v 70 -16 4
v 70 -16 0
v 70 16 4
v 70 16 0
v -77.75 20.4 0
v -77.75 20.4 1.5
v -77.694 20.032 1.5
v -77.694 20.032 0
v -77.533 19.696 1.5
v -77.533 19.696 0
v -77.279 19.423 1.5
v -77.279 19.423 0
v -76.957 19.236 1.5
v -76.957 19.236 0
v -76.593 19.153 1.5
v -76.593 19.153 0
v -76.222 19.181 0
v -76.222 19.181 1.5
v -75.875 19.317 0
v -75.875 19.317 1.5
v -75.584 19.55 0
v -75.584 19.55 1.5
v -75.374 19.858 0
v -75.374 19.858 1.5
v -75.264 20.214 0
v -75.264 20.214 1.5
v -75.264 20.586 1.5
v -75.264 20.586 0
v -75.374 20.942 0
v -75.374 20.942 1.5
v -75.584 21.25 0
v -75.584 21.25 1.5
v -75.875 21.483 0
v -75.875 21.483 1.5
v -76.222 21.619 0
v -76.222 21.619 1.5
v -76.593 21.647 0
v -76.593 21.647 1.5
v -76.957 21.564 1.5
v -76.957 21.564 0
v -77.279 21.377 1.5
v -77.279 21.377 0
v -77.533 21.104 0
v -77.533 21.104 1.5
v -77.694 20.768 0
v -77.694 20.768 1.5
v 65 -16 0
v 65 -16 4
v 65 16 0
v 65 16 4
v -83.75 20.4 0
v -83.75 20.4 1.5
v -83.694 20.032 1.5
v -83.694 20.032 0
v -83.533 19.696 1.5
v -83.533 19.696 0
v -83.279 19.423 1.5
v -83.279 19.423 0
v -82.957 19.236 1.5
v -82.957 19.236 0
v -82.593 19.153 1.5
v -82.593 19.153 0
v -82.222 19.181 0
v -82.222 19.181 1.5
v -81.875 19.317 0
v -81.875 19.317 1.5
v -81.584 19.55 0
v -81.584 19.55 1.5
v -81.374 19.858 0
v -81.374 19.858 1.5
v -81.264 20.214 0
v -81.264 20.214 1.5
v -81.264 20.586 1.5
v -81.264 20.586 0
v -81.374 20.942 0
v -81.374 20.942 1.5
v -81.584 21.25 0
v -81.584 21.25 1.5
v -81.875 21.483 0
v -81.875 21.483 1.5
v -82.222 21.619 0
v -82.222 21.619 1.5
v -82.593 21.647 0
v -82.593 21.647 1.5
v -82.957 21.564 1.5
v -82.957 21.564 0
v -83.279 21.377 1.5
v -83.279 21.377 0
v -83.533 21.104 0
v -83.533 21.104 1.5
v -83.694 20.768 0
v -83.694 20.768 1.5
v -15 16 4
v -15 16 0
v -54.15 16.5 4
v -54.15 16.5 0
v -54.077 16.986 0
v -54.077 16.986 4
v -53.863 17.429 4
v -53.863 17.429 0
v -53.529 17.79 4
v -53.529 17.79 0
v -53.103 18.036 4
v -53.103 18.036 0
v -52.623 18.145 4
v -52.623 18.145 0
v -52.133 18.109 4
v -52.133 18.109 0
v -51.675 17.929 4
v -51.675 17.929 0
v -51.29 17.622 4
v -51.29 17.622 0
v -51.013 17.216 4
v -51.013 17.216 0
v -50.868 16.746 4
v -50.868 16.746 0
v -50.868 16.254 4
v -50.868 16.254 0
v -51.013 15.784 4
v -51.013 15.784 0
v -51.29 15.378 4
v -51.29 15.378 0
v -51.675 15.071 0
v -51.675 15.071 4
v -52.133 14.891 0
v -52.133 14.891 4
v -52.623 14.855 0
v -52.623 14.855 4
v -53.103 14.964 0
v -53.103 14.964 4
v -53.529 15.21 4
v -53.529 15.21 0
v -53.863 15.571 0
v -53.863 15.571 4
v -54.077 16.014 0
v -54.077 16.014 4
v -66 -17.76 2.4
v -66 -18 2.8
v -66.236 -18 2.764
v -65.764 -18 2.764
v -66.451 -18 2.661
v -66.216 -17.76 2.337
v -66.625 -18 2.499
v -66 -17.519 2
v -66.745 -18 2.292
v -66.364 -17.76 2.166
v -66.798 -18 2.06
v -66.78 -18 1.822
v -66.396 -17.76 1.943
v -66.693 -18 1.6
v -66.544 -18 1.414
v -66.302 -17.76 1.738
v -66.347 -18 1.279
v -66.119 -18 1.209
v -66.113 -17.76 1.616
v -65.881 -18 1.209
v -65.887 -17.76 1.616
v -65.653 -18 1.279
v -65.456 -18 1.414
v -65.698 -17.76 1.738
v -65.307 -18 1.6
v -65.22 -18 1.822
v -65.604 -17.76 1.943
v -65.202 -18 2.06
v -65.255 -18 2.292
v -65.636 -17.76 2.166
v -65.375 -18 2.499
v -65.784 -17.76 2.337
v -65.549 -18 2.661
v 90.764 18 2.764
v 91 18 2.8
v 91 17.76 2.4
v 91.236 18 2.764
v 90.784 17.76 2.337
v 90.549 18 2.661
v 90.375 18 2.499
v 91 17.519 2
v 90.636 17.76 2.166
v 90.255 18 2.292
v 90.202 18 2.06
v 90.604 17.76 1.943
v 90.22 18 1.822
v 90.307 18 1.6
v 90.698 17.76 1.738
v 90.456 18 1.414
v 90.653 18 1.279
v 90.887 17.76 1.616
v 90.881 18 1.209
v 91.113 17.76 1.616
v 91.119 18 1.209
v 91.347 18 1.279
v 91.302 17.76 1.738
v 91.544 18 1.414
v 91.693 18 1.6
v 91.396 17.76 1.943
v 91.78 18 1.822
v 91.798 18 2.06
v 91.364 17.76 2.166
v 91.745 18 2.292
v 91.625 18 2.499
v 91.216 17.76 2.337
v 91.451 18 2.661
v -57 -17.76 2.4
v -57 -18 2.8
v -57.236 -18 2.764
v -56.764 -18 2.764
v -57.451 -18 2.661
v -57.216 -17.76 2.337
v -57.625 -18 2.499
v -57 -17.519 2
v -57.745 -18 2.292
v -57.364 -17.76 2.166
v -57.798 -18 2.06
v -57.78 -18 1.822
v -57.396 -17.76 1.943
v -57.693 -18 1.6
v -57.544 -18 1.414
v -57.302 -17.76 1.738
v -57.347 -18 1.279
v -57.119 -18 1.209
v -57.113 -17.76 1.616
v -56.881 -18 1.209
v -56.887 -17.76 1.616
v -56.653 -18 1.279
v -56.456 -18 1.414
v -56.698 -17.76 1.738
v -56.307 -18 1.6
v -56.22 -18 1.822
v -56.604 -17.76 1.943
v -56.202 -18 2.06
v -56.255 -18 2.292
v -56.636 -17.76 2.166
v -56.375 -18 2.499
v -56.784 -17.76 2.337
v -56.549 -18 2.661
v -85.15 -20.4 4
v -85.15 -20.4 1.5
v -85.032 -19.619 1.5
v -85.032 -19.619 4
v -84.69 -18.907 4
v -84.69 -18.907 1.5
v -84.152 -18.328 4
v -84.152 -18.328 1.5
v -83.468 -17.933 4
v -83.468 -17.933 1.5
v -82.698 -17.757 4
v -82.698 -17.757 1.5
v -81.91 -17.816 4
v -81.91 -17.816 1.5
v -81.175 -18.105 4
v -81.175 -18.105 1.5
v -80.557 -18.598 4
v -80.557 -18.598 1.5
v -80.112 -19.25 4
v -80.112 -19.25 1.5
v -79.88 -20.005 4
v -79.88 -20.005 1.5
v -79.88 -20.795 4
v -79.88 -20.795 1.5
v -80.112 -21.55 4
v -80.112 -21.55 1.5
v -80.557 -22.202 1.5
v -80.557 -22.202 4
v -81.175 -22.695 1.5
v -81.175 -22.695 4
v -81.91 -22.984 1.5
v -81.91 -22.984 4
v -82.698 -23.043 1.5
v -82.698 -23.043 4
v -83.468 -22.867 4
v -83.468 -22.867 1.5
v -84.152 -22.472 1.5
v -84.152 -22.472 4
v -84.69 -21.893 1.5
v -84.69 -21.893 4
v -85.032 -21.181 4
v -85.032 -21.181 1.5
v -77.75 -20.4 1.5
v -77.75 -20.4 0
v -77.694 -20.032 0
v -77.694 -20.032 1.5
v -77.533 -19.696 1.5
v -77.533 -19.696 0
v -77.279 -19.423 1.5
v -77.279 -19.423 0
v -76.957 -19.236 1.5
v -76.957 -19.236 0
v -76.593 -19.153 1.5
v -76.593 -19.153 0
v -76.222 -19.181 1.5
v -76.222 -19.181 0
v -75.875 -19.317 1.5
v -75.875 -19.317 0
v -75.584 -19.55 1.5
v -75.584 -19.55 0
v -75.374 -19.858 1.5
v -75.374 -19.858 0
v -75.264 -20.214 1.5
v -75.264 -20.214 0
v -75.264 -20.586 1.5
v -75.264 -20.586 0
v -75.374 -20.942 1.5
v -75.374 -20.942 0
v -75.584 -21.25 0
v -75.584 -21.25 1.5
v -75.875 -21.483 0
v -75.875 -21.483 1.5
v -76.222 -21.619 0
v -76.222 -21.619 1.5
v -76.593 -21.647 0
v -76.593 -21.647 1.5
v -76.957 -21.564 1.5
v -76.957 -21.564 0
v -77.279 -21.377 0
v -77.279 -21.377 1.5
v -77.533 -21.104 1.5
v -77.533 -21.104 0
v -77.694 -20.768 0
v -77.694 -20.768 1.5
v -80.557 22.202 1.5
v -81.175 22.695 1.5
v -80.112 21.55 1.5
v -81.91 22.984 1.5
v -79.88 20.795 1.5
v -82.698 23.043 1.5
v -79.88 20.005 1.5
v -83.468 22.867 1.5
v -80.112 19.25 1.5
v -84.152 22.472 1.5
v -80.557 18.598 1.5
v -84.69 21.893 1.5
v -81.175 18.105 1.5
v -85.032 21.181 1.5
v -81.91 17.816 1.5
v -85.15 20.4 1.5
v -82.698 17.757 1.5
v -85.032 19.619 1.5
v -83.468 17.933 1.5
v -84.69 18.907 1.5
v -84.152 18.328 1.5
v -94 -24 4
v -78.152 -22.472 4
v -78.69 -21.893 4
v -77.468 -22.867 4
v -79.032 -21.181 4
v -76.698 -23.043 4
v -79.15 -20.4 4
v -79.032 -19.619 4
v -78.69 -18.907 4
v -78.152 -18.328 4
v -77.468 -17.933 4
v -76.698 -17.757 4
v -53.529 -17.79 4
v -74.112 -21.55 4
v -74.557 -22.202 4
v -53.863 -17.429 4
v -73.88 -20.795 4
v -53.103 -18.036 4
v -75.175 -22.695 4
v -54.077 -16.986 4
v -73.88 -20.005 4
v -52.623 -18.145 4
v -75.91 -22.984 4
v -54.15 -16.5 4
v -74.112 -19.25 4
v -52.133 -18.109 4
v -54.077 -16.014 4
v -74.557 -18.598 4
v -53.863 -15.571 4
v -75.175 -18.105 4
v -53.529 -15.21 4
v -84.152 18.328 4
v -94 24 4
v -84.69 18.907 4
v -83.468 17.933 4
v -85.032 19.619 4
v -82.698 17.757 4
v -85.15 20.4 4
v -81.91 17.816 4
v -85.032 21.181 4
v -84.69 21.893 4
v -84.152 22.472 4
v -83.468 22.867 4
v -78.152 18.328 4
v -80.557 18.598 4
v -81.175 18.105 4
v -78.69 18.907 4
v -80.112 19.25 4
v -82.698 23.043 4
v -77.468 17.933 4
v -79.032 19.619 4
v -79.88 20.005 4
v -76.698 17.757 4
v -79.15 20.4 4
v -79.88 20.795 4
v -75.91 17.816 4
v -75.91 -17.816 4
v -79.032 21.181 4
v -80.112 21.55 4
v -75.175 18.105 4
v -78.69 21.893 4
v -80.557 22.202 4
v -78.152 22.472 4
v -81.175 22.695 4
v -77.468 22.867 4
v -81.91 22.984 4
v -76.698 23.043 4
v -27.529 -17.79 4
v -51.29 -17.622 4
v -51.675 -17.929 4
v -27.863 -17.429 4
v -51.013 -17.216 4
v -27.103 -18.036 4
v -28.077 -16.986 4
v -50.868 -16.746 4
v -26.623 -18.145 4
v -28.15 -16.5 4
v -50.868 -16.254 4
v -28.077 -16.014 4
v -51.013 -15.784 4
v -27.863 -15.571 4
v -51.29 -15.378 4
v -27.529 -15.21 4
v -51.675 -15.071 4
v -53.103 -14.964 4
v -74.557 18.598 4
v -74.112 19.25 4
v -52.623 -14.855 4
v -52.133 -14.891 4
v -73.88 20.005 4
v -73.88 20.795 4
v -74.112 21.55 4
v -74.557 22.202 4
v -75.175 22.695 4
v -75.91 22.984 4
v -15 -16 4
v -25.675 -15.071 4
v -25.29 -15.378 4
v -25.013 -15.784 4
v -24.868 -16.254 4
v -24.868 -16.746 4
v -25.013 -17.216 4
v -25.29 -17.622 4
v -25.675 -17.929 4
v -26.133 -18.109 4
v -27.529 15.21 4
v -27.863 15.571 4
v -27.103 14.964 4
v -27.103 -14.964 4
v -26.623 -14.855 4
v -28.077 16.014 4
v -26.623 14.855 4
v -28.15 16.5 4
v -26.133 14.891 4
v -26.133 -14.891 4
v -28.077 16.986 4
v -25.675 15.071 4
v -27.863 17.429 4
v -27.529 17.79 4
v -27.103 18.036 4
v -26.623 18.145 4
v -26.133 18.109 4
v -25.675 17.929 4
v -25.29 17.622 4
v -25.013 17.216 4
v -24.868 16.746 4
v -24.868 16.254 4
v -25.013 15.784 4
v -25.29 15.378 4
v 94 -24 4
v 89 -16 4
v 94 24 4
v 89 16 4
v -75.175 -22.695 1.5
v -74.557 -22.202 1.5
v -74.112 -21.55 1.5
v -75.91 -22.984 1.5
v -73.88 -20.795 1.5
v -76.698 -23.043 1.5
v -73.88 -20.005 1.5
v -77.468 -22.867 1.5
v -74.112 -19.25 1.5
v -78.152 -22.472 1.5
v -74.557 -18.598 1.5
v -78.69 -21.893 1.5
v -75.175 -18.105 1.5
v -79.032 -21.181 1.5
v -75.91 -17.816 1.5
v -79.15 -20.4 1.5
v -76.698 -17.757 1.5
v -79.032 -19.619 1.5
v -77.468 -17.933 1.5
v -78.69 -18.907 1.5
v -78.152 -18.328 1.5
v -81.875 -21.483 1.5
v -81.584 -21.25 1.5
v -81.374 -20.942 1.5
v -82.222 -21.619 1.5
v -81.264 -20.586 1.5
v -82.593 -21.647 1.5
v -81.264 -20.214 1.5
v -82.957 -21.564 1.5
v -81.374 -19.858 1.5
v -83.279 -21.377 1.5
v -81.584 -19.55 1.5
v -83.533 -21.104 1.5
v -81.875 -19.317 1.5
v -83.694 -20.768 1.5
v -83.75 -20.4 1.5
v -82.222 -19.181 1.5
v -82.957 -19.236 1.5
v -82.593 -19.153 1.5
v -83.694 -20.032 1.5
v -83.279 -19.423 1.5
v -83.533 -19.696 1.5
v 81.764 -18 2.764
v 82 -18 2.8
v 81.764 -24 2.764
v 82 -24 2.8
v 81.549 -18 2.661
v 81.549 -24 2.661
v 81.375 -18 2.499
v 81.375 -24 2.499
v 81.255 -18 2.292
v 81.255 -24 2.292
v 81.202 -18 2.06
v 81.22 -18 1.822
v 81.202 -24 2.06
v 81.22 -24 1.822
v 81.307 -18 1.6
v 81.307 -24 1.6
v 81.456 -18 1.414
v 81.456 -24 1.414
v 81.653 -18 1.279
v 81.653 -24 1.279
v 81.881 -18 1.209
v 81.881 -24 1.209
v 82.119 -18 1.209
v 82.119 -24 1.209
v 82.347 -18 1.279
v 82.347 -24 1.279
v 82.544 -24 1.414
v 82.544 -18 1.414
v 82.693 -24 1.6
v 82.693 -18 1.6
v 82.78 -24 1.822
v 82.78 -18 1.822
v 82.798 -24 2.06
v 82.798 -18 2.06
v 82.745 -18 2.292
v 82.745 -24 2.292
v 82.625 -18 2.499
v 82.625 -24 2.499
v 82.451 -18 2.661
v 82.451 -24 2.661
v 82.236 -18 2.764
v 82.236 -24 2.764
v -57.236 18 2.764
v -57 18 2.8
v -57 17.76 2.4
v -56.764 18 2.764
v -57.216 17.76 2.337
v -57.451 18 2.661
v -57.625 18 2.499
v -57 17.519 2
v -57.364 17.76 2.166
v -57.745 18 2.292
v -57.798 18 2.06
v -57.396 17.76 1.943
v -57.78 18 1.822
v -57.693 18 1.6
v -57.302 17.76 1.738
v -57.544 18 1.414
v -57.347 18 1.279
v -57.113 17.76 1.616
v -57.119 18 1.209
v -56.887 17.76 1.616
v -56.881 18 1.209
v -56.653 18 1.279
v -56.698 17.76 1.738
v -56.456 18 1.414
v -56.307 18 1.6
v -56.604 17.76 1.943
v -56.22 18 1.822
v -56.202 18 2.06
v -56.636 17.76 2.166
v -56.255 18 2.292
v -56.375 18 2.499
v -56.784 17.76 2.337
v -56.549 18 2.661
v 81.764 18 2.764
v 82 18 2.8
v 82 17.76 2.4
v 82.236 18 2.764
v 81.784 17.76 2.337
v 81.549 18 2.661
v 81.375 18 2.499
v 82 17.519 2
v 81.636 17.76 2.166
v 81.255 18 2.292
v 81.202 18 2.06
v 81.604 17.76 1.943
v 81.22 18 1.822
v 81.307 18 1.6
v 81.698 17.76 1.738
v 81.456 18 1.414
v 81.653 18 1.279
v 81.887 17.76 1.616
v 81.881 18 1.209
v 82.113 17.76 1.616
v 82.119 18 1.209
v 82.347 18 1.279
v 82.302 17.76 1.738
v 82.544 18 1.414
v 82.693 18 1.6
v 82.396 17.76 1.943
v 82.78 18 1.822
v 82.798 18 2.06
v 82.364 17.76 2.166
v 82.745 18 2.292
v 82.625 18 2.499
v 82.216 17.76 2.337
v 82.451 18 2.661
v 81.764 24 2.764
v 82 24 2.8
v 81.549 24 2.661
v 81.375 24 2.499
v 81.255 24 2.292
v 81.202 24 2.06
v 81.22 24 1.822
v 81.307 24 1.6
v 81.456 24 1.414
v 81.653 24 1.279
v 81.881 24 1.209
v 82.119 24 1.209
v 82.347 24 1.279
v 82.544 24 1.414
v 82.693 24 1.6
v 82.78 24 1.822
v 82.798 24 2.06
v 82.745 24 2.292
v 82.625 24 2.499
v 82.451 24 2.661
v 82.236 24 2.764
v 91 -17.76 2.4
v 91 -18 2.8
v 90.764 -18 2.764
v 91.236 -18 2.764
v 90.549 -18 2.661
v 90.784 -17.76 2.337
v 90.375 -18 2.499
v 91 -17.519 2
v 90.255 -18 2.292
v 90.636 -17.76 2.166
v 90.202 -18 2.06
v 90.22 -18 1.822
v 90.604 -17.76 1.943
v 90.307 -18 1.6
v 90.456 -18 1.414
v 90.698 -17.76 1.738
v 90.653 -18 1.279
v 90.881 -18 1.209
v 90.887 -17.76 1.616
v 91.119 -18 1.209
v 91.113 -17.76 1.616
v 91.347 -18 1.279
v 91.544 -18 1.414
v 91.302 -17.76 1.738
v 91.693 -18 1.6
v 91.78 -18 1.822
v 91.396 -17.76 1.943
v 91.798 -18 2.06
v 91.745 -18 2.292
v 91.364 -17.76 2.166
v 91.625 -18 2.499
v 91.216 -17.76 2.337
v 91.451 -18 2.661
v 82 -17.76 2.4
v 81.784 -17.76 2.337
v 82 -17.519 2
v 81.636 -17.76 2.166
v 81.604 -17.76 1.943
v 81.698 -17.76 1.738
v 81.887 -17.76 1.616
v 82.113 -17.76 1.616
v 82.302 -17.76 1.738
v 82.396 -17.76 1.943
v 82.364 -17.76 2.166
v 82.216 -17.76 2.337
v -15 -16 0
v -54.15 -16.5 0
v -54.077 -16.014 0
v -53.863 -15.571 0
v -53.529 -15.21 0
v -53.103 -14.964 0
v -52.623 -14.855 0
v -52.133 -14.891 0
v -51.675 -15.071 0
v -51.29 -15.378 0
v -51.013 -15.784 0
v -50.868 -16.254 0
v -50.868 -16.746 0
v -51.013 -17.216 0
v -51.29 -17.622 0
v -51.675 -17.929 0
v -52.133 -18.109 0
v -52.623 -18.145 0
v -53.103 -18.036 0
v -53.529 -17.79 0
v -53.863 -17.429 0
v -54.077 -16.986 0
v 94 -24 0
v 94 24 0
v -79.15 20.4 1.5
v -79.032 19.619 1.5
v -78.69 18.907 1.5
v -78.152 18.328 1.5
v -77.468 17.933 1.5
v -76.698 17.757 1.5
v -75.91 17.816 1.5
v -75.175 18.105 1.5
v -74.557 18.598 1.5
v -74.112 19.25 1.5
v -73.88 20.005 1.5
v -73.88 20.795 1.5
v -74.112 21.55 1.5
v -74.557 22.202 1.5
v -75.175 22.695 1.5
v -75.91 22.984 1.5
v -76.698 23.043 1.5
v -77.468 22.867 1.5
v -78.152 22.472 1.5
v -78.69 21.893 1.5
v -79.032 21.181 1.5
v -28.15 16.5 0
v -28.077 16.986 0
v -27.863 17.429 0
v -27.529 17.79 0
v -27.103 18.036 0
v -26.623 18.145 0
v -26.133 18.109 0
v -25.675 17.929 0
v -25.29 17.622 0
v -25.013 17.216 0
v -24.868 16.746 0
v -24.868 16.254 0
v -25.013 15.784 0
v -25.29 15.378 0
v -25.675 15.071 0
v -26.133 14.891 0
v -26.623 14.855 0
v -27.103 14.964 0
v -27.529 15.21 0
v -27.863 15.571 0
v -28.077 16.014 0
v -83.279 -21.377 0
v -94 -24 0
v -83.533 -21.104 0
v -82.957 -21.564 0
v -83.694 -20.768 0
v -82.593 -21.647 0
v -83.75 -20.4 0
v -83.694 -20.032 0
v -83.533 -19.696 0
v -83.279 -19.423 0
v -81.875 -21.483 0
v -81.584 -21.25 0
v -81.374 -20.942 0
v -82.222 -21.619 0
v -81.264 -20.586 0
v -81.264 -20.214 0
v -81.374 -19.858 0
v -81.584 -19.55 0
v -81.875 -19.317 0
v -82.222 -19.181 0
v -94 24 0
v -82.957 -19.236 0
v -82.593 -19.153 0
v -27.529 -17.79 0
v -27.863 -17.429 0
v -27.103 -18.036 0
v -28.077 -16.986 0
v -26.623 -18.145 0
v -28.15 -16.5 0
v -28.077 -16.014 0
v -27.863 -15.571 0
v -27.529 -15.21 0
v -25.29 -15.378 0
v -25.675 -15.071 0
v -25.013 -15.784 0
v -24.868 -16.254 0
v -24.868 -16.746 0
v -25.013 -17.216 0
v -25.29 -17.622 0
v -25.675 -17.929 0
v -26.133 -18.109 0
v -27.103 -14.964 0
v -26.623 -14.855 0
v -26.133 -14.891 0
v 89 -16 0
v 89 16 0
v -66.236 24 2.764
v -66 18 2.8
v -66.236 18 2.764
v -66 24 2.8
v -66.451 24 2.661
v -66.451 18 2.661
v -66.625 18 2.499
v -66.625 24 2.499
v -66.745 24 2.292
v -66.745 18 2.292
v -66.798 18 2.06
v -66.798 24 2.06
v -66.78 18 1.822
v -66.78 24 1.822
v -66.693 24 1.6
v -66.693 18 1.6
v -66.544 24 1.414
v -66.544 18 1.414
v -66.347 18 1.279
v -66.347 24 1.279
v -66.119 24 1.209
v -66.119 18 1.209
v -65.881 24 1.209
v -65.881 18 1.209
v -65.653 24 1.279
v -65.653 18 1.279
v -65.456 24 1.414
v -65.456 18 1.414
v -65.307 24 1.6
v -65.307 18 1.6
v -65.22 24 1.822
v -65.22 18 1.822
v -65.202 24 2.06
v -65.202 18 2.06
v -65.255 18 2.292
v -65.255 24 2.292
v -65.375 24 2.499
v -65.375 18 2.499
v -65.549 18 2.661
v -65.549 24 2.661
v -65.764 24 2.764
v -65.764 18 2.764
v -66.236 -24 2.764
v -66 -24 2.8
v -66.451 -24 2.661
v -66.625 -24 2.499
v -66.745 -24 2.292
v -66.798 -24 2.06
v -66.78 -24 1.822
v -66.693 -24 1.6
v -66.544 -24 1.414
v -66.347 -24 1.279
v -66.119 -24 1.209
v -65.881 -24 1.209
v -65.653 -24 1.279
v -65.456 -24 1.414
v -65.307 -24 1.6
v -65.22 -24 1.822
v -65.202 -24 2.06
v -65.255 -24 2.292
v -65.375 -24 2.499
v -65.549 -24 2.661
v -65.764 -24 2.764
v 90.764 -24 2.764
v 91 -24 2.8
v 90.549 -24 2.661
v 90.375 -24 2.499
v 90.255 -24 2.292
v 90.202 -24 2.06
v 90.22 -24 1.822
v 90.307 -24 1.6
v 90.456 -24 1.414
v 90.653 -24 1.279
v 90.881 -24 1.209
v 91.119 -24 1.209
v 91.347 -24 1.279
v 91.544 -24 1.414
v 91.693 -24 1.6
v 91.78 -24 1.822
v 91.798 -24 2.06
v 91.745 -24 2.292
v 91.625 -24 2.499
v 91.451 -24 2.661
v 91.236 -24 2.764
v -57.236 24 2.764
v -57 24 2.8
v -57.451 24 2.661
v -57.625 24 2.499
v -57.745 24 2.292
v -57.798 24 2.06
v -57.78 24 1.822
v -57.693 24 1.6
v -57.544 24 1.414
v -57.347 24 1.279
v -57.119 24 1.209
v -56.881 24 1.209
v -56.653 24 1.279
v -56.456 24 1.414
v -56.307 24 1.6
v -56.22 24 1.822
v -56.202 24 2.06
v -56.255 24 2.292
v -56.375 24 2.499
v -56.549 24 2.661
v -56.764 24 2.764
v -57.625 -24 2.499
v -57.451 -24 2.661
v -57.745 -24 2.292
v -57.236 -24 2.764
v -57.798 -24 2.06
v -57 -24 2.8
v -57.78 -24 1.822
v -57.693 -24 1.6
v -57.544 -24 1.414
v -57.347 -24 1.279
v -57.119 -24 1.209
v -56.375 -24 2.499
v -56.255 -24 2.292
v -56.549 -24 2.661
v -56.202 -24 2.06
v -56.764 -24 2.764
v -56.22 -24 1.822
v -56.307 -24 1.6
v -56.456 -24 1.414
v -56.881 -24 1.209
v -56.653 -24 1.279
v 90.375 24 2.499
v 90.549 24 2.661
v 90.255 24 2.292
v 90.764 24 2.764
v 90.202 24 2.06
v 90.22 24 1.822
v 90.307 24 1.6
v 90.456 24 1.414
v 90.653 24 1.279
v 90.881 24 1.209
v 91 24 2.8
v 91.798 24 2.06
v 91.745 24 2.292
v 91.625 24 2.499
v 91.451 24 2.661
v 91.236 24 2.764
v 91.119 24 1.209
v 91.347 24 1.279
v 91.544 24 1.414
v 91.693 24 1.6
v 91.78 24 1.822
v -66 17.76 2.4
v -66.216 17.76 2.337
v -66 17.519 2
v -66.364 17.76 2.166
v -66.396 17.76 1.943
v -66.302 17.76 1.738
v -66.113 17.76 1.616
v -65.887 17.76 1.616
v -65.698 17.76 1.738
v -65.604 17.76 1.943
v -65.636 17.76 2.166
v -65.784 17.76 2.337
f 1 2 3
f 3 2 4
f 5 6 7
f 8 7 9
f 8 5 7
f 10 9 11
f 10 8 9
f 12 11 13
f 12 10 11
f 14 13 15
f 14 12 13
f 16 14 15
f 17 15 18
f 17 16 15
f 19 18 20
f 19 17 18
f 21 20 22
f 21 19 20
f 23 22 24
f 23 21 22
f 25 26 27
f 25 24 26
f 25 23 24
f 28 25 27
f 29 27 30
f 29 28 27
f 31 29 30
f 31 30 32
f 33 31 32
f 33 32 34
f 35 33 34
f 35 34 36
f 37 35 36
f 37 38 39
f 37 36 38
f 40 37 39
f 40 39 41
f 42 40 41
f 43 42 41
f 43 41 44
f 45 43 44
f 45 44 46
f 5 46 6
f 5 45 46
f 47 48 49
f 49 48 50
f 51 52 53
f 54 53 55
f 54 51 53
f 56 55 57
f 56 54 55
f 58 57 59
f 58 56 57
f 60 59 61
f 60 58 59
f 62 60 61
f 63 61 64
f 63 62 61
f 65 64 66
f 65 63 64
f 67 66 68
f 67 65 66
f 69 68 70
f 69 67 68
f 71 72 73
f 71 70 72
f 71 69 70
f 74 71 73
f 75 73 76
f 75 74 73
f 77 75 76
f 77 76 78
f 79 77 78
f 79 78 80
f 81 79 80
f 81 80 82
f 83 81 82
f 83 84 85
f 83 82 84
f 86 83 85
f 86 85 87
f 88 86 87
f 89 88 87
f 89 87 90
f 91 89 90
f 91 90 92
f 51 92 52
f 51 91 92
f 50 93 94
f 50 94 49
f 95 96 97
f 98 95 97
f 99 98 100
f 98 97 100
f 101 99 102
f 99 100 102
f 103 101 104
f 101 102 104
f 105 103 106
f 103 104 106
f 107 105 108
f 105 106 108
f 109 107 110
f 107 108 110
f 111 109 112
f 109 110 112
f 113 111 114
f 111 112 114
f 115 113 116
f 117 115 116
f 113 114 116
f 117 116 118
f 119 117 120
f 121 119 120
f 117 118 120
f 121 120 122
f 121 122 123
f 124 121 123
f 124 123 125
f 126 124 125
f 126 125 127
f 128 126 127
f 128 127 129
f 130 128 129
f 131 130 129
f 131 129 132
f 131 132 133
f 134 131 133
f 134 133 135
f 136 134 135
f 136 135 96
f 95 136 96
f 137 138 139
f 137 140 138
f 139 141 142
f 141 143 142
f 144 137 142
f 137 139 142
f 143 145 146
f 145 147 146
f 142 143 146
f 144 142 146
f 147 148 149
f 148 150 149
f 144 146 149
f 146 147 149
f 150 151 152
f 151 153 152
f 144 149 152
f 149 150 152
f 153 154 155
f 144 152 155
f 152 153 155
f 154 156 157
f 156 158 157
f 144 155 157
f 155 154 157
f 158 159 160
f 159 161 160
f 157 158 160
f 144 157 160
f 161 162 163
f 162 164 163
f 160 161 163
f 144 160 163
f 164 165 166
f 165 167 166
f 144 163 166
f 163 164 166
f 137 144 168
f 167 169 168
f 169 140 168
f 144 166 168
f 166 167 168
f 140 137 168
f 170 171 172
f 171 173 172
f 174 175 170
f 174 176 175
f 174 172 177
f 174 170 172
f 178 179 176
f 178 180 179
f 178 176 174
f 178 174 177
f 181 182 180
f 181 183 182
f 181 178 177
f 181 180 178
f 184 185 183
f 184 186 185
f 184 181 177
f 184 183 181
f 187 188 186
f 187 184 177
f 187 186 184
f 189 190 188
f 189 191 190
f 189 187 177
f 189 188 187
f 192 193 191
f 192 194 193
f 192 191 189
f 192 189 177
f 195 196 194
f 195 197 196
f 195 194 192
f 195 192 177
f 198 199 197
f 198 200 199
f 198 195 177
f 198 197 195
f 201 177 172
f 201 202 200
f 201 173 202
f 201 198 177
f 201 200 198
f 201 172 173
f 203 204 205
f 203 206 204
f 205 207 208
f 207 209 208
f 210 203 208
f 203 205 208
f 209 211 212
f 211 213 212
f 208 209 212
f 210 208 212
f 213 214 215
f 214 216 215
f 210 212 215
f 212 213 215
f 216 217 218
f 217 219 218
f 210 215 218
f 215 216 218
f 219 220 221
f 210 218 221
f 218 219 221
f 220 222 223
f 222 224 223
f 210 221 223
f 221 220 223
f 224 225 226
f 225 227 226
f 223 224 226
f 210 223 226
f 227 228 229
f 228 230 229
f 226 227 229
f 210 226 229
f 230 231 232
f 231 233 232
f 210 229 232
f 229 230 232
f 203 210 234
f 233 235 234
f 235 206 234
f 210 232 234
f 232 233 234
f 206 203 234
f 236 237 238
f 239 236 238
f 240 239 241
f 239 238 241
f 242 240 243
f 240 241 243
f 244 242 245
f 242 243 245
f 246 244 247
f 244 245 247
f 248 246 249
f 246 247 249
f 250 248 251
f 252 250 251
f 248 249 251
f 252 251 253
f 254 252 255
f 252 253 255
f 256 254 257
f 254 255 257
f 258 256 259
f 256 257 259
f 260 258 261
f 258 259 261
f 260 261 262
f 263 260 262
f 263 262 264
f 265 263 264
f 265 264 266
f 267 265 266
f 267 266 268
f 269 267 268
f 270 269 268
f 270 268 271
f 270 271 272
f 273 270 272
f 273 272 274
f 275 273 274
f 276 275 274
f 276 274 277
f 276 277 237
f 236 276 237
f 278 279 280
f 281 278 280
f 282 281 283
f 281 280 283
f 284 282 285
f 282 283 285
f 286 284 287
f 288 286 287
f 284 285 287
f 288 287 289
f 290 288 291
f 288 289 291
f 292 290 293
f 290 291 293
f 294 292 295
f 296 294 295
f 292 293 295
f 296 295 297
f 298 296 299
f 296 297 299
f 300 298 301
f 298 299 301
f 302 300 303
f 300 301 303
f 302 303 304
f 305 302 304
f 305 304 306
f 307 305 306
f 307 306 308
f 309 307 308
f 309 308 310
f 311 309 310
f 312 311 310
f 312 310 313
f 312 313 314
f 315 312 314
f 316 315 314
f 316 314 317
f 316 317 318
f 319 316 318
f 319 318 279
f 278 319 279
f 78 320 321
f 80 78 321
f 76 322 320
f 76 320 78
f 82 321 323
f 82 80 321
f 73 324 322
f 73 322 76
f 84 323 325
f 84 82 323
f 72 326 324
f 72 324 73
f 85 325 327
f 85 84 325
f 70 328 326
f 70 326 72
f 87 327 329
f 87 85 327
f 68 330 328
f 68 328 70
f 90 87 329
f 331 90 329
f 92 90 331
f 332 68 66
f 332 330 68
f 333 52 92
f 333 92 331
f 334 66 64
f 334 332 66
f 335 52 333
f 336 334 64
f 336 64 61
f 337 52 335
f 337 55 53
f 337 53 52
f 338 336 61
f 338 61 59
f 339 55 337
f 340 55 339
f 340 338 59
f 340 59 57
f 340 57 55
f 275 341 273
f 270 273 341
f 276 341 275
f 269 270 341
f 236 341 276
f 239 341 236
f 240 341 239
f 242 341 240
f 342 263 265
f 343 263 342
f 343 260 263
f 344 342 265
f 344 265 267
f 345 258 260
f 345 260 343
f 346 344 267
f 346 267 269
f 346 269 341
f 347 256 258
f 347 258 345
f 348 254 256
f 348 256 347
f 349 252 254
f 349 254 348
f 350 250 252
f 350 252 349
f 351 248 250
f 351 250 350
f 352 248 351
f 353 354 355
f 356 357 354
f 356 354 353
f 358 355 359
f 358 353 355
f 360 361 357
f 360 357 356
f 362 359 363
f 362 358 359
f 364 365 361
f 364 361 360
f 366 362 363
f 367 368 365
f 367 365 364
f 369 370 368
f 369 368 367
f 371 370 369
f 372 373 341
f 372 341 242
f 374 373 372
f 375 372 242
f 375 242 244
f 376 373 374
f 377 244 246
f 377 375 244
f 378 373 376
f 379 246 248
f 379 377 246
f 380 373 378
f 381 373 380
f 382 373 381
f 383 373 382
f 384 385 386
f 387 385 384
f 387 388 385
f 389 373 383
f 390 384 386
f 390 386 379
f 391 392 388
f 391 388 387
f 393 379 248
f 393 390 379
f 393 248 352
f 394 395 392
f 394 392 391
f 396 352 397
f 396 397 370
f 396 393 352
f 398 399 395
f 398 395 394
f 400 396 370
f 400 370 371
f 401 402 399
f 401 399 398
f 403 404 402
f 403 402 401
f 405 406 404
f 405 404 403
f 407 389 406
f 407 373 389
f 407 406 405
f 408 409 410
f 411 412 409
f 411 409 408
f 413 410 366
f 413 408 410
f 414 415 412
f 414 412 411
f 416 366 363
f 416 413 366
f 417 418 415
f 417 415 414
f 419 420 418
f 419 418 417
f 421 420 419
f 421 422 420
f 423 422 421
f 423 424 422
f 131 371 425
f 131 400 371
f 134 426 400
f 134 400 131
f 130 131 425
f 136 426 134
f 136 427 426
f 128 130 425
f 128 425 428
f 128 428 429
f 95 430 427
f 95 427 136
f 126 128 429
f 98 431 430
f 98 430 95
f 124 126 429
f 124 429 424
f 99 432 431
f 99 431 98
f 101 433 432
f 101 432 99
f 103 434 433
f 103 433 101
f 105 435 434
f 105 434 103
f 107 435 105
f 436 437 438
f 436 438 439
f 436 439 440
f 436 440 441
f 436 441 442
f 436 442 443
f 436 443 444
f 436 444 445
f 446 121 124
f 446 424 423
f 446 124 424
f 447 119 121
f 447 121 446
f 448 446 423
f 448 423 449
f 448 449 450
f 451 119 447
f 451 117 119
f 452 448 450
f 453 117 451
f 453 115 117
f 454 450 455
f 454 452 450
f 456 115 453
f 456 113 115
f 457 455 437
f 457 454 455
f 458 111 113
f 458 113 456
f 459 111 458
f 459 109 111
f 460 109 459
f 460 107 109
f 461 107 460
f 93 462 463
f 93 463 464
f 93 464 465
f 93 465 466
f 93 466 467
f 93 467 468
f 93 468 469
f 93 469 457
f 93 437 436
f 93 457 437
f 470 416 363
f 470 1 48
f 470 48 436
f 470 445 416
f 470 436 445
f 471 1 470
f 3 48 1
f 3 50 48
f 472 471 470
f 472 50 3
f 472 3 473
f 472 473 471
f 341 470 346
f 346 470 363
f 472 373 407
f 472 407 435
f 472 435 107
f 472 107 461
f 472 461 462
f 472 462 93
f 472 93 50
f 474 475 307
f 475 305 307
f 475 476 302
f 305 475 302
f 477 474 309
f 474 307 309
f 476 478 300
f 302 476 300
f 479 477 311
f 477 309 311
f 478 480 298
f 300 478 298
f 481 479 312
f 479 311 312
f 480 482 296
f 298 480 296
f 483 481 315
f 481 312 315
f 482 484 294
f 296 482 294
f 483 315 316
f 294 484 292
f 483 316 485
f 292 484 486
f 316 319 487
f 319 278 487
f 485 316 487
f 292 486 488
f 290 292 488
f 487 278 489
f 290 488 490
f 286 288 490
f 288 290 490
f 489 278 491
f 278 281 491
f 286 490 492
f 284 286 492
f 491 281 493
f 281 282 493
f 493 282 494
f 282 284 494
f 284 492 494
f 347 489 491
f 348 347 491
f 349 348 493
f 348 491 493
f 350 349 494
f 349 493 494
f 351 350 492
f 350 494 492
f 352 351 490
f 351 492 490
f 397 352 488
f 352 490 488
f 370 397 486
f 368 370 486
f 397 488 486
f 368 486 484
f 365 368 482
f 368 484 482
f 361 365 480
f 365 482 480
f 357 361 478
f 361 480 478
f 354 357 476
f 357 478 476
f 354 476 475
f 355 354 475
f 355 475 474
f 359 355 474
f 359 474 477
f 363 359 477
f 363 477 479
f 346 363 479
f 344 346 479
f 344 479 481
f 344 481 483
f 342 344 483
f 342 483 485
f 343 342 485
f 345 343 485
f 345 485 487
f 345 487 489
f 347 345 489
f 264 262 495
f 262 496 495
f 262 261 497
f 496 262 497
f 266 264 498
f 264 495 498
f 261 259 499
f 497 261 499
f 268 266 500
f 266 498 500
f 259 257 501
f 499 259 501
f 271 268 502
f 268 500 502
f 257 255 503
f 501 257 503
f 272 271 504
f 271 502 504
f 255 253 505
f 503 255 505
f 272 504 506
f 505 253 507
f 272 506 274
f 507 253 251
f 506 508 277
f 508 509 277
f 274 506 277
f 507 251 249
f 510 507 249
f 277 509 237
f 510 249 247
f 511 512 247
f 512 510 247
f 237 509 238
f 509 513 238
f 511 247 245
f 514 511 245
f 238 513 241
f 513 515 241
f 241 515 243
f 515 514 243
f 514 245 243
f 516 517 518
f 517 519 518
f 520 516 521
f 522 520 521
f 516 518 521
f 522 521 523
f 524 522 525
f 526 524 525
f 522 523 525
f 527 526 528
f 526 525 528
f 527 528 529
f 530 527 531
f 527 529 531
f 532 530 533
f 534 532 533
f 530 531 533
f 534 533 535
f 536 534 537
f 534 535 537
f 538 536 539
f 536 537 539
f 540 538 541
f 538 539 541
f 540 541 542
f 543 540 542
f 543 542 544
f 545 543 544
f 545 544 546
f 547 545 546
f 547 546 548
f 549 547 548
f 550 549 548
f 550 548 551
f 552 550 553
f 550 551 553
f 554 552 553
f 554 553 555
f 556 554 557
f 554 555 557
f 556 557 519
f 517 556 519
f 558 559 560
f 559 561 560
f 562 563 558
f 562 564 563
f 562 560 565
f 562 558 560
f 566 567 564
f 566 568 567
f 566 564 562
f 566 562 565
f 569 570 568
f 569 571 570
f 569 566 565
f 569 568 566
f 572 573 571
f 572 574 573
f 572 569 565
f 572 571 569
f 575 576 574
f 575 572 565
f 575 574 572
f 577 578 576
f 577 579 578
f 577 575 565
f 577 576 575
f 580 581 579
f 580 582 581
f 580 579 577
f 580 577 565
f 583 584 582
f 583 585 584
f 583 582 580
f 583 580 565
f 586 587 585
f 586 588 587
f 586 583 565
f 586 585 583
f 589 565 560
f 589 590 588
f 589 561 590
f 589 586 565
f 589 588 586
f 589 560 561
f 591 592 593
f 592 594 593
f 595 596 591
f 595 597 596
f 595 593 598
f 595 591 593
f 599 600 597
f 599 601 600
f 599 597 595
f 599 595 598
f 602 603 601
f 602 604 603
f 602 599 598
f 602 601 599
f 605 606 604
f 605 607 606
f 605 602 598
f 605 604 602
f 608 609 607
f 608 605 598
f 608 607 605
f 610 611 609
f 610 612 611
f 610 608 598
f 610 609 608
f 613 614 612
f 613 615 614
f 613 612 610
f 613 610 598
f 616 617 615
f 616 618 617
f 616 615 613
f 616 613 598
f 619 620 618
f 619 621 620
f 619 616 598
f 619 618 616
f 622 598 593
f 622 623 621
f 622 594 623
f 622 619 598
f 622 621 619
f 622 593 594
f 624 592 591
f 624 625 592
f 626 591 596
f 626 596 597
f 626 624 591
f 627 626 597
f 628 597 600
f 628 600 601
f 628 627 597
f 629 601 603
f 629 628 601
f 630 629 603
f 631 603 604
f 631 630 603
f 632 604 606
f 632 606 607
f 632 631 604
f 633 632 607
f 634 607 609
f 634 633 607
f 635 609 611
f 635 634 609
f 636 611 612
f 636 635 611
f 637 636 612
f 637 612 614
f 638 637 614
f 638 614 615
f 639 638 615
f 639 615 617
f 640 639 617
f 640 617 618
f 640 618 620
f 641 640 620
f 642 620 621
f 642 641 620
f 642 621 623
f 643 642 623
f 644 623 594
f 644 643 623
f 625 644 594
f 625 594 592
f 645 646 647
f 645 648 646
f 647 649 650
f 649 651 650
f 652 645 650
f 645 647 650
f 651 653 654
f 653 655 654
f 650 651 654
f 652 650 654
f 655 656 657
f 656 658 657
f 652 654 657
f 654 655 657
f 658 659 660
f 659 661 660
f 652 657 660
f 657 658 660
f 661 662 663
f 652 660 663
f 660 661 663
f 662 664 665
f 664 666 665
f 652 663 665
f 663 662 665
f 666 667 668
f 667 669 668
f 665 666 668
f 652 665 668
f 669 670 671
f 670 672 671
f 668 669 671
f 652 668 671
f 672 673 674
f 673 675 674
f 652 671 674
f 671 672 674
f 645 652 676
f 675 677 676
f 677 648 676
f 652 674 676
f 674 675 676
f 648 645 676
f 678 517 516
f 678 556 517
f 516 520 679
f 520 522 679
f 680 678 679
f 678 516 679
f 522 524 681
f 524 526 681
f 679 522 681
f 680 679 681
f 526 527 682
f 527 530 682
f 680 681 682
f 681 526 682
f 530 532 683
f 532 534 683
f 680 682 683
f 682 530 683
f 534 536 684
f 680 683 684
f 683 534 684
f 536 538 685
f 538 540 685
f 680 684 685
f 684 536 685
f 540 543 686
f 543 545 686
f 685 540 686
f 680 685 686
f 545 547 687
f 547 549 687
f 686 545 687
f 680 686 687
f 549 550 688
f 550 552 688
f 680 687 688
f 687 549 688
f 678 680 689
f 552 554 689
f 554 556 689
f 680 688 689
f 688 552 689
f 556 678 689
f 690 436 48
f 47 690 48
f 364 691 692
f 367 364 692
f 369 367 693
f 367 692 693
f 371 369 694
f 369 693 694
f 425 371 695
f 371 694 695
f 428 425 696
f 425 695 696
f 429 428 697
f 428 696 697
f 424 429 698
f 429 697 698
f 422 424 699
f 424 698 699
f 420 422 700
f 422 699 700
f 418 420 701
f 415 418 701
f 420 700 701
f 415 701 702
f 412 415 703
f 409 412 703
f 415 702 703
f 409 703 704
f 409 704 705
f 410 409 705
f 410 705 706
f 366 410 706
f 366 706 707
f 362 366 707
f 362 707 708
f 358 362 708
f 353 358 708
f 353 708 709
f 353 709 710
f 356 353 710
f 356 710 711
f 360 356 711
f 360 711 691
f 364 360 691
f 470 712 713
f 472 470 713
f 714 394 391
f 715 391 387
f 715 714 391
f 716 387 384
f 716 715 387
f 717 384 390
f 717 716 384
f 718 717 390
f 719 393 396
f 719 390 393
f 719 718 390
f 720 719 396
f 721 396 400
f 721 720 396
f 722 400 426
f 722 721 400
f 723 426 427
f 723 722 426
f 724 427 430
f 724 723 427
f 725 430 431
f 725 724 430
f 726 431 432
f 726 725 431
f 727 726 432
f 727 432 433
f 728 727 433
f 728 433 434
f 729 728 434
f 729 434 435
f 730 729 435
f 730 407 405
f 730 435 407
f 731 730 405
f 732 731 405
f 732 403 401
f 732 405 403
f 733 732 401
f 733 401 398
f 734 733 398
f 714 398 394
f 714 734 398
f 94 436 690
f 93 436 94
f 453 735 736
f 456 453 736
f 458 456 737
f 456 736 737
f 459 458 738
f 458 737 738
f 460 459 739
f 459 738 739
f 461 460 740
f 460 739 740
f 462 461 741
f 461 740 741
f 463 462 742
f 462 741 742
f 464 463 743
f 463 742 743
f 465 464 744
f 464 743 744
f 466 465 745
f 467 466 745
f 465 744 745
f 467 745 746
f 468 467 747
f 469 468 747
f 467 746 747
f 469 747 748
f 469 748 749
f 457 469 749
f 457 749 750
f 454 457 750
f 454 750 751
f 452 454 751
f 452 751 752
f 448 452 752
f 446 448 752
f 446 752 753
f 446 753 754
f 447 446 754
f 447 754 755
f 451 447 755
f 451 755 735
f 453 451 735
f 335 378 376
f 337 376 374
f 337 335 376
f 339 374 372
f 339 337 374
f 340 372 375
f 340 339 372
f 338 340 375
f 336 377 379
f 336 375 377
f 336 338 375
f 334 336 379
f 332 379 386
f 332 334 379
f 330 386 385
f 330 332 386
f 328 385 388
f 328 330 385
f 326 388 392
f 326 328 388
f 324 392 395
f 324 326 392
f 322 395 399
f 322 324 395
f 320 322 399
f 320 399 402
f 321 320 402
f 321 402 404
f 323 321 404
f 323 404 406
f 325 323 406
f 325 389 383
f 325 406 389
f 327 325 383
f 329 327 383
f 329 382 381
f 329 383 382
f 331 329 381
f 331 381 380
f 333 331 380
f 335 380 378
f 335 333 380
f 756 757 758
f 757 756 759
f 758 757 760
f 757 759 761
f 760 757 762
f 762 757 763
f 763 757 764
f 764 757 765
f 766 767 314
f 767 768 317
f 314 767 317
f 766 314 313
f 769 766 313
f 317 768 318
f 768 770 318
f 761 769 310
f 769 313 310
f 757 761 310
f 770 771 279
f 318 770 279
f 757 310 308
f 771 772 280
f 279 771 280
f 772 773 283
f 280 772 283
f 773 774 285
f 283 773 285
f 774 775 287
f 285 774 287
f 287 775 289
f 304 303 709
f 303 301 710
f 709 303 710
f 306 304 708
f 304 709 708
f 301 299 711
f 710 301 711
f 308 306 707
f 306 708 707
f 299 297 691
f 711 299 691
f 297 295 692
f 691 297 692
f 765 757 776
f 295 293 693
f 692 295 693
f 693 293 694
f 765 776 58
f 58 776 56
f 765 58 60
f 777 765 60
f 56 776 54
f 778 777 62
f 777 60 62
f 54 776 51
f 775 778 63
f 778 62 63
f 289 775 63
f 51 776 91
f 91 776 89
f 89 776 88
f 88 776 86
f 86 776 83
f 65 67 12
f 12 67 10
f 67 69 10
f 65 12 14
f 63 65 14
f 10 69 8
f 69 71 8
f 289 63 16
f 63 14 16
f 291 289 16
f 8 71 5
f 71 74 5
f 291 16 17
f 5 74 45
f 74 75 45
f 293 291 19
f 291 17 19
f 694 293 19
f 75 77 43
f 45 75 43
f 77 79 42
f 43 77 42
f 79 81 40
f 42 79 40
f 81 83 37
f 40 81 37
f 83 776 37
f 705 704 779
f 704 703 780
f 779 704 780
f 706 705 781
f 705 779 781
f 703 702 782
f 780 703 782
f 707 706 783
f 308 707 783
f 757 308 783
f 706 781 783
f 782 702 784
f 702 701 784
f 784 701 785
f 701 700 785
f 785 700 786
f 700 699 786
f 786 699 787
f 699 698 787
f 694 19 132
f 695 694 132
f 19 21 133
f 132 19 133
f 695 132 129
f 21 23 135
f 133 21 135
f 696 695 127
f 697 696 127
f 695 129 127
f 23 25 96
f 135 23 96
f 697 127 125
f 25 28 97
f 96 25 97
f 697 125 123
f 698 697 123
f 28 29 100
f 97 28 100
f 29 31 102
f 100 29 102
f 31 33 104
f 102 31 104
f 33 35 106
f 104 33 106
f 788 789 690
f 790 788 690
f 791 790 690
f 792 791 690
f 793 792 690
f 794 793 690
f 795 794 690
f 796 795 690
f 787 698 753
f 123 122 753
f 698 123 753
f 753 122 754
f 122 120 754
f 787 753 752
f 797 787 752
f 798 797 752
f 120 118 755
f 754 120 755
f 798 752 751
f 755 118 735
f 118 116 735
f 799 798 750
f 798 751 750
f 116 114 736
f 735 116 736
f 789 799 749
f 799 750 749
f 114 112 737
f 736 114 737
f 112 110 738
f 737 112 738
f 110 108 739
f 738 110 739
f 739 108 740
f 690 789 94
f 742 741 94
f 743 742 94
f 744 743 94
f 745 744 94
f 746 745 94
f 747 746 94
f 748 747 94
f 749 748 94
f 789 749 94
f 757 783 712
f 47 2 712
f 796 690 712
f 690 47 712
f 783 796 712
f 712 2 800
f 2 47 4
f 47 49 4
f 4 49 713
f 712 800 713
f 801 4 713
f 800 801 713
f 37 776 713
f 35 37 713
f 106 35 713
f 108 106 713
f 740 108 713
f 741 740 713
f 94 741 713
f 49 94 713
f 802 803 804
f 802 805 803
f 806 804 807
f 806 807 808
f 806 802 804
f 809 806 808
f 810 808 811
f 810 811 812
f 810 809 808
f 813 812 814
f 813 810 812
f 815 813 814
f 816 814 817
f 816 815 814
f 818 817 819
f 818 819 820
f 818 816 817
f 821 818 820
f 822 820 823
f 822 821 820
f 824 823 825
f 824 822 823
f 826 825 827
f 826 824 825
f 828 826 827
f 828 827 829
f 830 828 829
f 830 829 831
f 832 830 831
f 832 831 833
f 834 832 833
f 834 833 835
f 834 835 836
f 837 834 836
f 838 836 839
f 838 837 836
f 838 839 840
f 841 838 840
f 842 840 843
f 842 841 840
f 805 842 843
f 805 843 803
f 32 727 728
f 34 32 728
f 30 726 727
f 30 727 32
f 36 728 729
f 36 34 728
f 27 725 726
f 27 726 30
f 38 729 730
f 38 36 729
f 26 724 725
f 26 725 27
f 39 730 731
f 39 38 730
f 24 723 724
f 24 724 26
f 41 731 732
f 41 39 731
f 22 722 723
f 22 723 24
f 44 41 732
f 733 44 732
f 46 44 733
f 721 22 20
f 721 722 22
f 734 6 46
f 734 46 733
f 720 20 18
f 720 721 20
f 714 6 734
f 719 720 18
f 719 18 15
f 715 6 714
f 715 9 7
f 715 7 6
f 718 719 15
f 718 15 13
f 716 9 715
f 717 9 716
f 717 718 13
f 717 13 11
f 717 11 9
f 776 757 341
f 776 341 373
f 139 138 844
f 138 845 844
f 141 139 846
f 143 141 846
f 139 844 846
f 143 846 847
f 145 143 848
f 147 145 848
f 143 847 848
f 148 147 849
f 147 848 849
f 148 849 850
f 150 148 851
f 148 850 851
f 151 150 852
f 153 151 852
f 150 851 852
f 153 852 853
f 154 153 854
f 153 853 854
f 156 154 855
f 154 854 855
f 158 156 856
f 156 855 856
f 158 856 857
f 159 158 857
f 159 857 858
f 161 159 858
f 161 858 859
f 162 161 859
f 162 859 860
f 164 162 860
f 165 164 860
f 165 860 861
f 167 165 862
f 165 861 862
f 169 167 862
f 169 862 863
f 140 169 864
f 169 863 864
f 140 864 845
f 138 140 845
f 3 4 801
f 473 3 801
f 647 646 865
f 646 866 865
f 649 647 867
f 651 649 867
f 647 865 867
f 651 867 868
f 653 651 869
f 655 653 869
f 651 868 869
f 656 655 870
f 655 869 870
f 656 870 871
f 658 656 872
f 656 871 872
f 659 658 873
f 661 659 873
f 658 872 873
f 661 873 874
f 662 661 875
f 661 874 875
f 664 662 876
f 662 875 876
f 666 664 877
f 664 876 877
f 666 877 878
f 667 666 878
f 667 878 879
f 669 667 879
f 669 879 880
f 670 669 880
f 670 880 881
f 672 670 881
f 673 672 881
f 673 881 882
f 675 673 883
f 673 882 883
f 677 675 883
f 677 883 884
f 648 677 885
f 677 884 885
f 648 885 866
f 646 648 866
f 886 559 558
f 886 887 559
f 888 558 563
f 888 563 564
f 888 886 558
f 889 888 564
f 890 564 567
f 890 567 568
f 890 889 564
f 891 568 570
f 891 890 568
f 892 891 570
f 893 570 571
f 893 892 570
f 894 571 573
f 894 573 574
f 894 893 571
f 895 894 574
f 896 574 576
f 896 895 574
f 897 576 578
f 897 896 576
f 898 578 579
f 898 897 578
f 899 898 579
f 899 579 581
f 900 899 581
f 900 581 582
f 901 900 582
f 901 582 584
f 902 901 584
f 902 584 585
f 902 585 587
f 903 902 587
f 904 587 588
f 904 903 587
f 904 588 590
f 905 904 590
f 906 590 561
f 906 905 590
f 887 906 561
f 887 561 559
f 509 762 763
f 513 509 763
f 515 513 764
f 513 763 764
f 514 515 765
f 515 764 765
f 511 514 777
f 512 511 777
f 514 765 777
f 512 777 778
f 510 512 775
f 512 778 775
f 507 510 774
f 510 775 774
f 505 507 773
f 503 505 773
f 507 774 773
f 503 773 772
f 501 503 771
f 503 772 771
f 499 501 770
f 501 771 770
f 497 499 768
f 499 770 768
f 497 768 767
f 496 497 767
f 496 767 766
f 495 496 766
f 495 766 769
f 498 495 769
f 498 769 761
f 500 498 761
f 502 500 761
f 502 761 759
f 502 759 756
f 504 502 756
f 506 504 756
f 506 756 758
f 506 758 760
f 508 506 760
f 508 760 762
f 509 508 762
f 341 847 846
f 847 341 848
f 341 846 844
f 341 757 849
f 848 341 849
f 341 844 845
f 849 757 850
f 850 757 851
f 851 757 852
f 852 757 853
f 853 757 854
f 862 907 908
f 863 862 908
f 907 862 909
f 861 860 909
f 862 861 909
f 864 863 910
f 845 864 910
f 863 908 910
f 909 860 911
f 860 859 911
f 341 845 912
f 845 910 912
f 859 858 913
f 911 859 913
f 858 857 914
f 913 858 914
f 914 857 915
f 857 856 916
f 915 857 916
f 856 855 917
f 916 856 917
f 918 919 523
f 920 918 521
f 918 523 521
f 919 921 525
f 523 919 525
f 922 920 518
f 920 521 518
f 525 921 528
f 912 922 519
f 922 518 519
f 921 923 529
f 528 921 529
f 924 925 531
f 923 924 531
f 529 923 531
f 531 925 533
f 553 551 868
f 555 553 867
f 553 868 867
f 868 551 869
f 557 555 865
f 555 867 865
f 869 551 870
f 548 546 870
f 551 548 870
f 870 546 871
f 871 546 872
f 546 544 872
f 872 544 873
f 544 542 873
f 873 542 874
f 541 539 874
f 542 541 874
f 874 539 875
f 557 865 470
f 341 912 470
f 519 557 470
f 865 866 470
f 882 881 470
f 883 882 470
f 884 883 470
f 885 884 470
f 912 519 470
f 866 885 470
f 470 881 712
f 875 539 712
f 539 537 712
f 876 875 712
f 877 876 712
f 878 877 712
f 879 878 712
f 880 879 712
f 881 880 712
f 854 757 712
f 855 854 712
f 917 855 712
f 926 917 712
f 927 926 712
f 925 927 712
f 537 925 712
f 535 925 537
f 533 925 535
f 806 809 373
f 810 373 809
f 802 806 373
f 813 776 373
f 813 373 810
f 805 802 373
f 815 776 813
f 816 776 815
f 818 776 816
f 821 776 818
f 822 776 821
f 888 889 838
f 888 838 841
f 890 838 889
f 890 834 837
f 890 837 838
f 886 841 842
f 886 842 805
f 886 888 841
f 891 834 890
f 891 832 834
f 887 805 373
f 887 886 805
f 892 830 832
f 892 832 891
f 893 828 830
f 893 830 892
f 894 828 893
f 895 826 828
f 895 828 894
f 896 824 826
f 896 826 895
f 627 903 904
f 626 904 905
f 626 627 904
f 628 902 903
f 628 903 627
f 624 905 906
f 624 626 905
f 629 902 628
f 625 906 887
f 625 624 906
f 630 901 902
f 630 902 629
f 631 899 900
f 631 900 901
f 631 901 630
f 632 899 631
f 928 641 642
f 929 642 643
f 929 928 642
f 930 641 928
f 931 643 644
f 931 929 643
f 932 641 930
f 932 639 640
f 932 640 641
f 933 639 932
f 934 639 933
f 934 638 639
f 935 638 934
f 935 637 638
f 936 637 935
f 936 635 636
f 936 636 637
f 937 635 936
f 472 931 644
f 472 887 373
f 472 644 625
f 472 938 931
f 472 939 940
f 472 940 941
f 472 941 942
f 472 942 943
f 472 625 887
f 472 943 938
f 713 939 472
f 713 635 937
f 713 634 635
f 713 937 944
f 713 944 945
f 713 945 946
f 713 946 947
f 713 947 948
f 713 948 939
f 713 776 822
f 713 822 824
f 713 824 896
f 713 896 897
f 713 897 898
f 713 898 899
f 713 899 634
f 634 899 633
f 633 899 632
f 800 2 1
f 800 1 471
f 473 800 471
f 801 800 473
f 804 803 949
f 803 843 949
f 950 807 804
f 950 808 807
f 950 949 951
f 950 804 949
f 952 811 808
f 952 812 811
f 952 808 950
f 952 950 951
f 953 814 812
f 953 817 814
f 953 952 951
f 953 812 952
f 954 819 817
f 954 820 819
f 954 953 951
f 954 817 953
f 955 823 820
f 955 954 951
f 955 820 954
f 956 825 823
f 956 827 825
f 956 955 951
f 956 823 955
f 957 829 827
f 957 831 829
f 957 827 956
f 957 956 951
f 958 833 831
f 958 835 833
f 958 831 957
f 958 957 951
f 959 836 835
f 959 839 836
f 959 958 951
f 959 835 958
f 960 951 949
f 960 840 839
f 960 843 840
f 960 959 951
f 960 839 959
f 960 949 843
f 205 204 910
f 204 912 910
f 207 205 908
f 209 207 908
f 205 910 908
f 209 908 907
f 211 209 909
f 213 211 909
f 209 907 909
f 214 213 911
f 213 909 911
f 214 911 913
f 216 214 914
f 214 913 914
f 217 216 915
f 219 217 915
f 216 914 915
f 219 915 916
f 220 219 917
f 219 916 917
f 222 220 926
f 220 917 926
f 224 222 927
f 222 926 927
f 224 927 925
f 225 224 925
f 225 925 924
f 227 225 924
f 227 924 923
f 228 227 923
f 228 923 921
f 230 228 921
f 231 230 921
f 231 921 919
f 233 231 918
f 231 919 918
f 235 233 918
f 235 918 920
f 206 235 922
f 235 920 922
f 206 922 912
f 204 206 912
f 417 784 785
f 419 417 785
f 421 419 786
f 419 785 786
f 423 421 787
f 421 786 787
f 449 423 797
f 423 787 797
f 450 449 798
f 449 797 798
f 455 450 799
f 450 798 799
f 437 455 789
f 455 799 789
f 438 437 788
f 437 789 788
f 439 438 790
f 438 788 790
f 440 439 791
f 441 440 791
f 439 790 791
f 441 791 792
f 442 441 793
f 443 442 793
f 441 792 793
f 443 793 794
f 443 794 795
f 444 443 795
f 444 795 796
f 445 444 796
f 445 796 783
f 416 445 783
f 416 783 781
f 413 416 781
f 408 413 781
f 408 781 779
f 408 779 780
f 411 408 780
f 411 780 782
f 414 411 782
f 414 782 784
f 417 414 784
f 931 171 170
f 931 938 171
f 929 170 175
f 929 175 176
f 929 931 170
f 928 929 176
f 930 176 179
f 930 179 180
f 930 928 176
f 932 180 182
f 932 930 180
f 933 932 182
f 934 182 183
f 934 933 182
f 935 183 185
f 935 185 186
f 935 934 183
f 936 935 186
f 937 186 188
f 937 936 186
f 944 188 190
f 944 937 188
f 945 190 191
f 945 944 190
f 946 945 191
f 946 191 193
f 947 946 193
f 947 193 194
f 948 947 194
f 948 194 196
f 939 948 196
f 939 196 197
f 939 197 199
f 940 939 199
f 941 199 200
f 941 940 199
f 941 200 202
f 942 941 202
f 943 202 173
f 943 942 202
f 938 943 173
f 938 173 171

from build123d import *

# Parameters (mm, degrees)
SKETCH1_W                  = 188
SKETCH1_H                  = 48
BOSS_EXTRUDE1_DEPTH        = 4
SKETCH2_R                  = 1.25
CUT_EXTRUDE1_DEPTH         = 4
CUT_EXTRUDE2_START         = -1.5
SKETCH3_R                  = 2.65
CUT_EXTRUDE2_DEPTH         = 10
M2_TAPPED_HOLE1_AT_2_COUNT = 2
M2_TAPPED_HOLE1_AT_2_PITCH = 9
M2_TAPPED_HOLE1_AT_3_COUNT = 2
M2_TAPPED_HOLE1_AT_3_PITCH = 148
M2_TAPPED_HOLE1_AT_4_COUNT = 2
M2_TAPPED_HOLE1_AT_4_PITCH = 157
CUT_EXTRUDE4_DEPTH         = 98.097888752
CUT_EXTRUDE4_DEPTH_BACK    = 4
SKETCH8_W                  = 19
SKETCH8_H                  = 32
SKETCH9_W                  = 80
SKETCH9_H                  = 32
CUT_EXTRUDE5_DEPTH         = 4
M4_TAPPED_HOLE1_D          = 3.3


with BuildPart() as part:
    # Sketch1 → Boss-Extrude1 (new body)
    with BuildSketch(Plane.XY):
        Rectangle(SKETCH1_W, SKETCH1_H)
    extrude(amount=BOSS_EXTRUDE1_DEPTH)

    # Sketch2 → Cut-Extrude1 (cut)
    with BuildSketch(Plane(origin=(0, 0, 0), x_dir=(-1, 0, 0), z_dir=(0, 0, -1))):
        with Locations((76.5, -20.4)):
            Circle(SKETCH2_R)
        with Locations((82.5, -20.4)):
            Circle(SKETCH2_R)
    cut_extrude1 = extrude(amount=-CUT_EXTRUDE1_DEPTH, mode=Mode.SUBTRACT)

    # Sketch3 → Cut-Extrude2 (cut)
    with BuildSketch(Plane(origin=(0, 0, 0), x_dir=(-1, 0, 0), z_dir=(0, 0, -1)).offset(CUT_EXTRUDE2_START)):
        with Locations((76.5, -20.4)):
            Circle(SKETCH3_R)
        with Locations((82.5, -20.4)):
            Circle(SKETCH3_R)
    cut_extrude2 = extrude(amount=-CUT_EXTRUDE2_DEPTH, mode=Mode.SUBTRACT)

    # Mirror1: Cut-Extrude1, Cut-Extrude2 across plane
    add(cut_extrude1.mirror(Plane(origin=(0, 0, 0), x_dir=(0, 0, 1), z_dir=(0, -1, 0))), mode=Mode.SUBTRACT)
    add(cut_extrude2.mirror(Plane(origin=(0, 0, 0), x_dir=(0, 0, 1), z_dir=(0, -1, 0))), mode=Mode.SUBTRACT)

    # Sketch7 → M2 Tapped Hole1 (revolve, cut)
    with BuildSketch(Plane(origin=(-66, 24, 2), x_dir=(0, 0, 1), z_dir=(1, 0, 0))):
        Polygon((0, 0), (0, 6.480688495), (0.8, 6), (0.8, 0), align=None)
    m2_tapped_hole1 = revolve(axis=Axis((-66, 30.35, 2), (0, -1, 0)), mode=Mode.SUBTRACT)

    # M2 Tapped Hole1 at 2: M2 Tapped Hole1 ×2
    with Locations(*[(i * M2_TAPPED_HOLE1_AT_2_PITCH, 0, 0) for i in range(1, M2_TAPPED_HOLE1_AT_2_COUNT)]):
        add(m2_tapped_hole1, mode=Mode.SUBTRACT)

    # M2 Tapped Hole1 at 3: M2 Tapped Hole1 ×2
    with Locations(*[(i * M2_TAPPED_HOLE1_AT_3_PITCH, 0, 0) for i in range(1, M2_TAPPED_HOLE1_AT_3_COUNT)]):
        add(m2_tapped_hole1, mode=Mode.SUBTRACT)

    # M2 Tapped Hole1 at 4: M2 Tapped Hole1 ×2
    with Locations(*[(i * M2_TAPPED_HOLE1_AT_4_PITCH, 0, 0) for i in range(1, M2_TAPPED_HOLE1_AT_4_COUNT)]):
        add(m2_tapped_hole1, mode=Mode.SUBTRACT)

    # Mirror3: M2 Tapped Hole1 across plane
    add(m2_tapped_hole1.mirror(Plane.ZX), mode=Mode.SUBTRACT)

    # Mirror3 copy 1 sketch → Mirror3 copy 1 (revolve, cut)
    with BuildSketch(Plane(origin=(-57, -24, 2), x_dir=(0, 0, 1), z_dir=(1, 0, 0))):
        Polygon((0, 0), (0, -6.480688495), (0.8, -6), (0.8, 0), align=None)
    revolve(axis=Axis((-57, -30.35, 2), (0, -1, 0)), mode=Mode.SUBTRACT)

    # Mirror3 copy 2 sketch → Mirror3 copy 2 (revolve, cut)
    with BuildSketch(Plane(origin=(82, -24, 2), x_dir=(0, 0, 1), z_dir=(1, 0, 0))):
        Polygon((0, 0), (0, -6.480688495), (0.8, -6), (0.8, 0), align=None)
    revolve(axis=Axis((82, -30.35, 2), (0, -1, 0)), mode=Mode.SUBTRACT)

    # Mirror3 copy 3 sketch → Mirror3 copy 3 (revolve, cut)
    with BuildSketch(Plane(origin=(91, -24, 2), x_dir=(0, 0, 1), z_dir=(1, 0, 0))):
        Polygon((0, 0), (0, -6.480688495), (0.8, -6), (0.8, 0), align=None)
    revolve(axis=Axis((91, -30.35, 2), (0, -1, 0)), mode=Mode.SUBTRACT)

    # Sketch8 → Cut-Extrude4 (cut, two sides: drawn at the far end of the back side and taken through both)
    with BuildSketch(Plane.XY.offset(4).offset(-CUT_EXTRUDE4_DEPTH_BACK)):
        with Locations((79.5, 0)):
            Rectangle(SKETCH8_W, SKETCH8_H)
    extrude(amount=CUT_EXTRUDE4_DEPTH + CUT_EXTRUDE4_DEPTH_BACK, mode=Mode.SUBTRACT)

    # Sketch9 → Cut-Extrude5 (cut)
    with BuildSketch(Plane.XY.offset(4)):
        with Locations((25, 0)):
            Rectangle(SKETCH9_W, SKETCH9_H)
    extrude(amount=-CUT_EXTRUDE5_DEPTH, mode=Mode.SUBTRACT)

    # M4 Tapped Hole1 (through all)
    with Locations(Plane.XY.offset(4)):
        with Locations((-52.5, 16.5), (-26.5, 16.5), (-26.5, -16.5), (-52.5, -16.5)):
            Hole(M4_TAPPED_HOLE1_D / 2)


solid = part.part
